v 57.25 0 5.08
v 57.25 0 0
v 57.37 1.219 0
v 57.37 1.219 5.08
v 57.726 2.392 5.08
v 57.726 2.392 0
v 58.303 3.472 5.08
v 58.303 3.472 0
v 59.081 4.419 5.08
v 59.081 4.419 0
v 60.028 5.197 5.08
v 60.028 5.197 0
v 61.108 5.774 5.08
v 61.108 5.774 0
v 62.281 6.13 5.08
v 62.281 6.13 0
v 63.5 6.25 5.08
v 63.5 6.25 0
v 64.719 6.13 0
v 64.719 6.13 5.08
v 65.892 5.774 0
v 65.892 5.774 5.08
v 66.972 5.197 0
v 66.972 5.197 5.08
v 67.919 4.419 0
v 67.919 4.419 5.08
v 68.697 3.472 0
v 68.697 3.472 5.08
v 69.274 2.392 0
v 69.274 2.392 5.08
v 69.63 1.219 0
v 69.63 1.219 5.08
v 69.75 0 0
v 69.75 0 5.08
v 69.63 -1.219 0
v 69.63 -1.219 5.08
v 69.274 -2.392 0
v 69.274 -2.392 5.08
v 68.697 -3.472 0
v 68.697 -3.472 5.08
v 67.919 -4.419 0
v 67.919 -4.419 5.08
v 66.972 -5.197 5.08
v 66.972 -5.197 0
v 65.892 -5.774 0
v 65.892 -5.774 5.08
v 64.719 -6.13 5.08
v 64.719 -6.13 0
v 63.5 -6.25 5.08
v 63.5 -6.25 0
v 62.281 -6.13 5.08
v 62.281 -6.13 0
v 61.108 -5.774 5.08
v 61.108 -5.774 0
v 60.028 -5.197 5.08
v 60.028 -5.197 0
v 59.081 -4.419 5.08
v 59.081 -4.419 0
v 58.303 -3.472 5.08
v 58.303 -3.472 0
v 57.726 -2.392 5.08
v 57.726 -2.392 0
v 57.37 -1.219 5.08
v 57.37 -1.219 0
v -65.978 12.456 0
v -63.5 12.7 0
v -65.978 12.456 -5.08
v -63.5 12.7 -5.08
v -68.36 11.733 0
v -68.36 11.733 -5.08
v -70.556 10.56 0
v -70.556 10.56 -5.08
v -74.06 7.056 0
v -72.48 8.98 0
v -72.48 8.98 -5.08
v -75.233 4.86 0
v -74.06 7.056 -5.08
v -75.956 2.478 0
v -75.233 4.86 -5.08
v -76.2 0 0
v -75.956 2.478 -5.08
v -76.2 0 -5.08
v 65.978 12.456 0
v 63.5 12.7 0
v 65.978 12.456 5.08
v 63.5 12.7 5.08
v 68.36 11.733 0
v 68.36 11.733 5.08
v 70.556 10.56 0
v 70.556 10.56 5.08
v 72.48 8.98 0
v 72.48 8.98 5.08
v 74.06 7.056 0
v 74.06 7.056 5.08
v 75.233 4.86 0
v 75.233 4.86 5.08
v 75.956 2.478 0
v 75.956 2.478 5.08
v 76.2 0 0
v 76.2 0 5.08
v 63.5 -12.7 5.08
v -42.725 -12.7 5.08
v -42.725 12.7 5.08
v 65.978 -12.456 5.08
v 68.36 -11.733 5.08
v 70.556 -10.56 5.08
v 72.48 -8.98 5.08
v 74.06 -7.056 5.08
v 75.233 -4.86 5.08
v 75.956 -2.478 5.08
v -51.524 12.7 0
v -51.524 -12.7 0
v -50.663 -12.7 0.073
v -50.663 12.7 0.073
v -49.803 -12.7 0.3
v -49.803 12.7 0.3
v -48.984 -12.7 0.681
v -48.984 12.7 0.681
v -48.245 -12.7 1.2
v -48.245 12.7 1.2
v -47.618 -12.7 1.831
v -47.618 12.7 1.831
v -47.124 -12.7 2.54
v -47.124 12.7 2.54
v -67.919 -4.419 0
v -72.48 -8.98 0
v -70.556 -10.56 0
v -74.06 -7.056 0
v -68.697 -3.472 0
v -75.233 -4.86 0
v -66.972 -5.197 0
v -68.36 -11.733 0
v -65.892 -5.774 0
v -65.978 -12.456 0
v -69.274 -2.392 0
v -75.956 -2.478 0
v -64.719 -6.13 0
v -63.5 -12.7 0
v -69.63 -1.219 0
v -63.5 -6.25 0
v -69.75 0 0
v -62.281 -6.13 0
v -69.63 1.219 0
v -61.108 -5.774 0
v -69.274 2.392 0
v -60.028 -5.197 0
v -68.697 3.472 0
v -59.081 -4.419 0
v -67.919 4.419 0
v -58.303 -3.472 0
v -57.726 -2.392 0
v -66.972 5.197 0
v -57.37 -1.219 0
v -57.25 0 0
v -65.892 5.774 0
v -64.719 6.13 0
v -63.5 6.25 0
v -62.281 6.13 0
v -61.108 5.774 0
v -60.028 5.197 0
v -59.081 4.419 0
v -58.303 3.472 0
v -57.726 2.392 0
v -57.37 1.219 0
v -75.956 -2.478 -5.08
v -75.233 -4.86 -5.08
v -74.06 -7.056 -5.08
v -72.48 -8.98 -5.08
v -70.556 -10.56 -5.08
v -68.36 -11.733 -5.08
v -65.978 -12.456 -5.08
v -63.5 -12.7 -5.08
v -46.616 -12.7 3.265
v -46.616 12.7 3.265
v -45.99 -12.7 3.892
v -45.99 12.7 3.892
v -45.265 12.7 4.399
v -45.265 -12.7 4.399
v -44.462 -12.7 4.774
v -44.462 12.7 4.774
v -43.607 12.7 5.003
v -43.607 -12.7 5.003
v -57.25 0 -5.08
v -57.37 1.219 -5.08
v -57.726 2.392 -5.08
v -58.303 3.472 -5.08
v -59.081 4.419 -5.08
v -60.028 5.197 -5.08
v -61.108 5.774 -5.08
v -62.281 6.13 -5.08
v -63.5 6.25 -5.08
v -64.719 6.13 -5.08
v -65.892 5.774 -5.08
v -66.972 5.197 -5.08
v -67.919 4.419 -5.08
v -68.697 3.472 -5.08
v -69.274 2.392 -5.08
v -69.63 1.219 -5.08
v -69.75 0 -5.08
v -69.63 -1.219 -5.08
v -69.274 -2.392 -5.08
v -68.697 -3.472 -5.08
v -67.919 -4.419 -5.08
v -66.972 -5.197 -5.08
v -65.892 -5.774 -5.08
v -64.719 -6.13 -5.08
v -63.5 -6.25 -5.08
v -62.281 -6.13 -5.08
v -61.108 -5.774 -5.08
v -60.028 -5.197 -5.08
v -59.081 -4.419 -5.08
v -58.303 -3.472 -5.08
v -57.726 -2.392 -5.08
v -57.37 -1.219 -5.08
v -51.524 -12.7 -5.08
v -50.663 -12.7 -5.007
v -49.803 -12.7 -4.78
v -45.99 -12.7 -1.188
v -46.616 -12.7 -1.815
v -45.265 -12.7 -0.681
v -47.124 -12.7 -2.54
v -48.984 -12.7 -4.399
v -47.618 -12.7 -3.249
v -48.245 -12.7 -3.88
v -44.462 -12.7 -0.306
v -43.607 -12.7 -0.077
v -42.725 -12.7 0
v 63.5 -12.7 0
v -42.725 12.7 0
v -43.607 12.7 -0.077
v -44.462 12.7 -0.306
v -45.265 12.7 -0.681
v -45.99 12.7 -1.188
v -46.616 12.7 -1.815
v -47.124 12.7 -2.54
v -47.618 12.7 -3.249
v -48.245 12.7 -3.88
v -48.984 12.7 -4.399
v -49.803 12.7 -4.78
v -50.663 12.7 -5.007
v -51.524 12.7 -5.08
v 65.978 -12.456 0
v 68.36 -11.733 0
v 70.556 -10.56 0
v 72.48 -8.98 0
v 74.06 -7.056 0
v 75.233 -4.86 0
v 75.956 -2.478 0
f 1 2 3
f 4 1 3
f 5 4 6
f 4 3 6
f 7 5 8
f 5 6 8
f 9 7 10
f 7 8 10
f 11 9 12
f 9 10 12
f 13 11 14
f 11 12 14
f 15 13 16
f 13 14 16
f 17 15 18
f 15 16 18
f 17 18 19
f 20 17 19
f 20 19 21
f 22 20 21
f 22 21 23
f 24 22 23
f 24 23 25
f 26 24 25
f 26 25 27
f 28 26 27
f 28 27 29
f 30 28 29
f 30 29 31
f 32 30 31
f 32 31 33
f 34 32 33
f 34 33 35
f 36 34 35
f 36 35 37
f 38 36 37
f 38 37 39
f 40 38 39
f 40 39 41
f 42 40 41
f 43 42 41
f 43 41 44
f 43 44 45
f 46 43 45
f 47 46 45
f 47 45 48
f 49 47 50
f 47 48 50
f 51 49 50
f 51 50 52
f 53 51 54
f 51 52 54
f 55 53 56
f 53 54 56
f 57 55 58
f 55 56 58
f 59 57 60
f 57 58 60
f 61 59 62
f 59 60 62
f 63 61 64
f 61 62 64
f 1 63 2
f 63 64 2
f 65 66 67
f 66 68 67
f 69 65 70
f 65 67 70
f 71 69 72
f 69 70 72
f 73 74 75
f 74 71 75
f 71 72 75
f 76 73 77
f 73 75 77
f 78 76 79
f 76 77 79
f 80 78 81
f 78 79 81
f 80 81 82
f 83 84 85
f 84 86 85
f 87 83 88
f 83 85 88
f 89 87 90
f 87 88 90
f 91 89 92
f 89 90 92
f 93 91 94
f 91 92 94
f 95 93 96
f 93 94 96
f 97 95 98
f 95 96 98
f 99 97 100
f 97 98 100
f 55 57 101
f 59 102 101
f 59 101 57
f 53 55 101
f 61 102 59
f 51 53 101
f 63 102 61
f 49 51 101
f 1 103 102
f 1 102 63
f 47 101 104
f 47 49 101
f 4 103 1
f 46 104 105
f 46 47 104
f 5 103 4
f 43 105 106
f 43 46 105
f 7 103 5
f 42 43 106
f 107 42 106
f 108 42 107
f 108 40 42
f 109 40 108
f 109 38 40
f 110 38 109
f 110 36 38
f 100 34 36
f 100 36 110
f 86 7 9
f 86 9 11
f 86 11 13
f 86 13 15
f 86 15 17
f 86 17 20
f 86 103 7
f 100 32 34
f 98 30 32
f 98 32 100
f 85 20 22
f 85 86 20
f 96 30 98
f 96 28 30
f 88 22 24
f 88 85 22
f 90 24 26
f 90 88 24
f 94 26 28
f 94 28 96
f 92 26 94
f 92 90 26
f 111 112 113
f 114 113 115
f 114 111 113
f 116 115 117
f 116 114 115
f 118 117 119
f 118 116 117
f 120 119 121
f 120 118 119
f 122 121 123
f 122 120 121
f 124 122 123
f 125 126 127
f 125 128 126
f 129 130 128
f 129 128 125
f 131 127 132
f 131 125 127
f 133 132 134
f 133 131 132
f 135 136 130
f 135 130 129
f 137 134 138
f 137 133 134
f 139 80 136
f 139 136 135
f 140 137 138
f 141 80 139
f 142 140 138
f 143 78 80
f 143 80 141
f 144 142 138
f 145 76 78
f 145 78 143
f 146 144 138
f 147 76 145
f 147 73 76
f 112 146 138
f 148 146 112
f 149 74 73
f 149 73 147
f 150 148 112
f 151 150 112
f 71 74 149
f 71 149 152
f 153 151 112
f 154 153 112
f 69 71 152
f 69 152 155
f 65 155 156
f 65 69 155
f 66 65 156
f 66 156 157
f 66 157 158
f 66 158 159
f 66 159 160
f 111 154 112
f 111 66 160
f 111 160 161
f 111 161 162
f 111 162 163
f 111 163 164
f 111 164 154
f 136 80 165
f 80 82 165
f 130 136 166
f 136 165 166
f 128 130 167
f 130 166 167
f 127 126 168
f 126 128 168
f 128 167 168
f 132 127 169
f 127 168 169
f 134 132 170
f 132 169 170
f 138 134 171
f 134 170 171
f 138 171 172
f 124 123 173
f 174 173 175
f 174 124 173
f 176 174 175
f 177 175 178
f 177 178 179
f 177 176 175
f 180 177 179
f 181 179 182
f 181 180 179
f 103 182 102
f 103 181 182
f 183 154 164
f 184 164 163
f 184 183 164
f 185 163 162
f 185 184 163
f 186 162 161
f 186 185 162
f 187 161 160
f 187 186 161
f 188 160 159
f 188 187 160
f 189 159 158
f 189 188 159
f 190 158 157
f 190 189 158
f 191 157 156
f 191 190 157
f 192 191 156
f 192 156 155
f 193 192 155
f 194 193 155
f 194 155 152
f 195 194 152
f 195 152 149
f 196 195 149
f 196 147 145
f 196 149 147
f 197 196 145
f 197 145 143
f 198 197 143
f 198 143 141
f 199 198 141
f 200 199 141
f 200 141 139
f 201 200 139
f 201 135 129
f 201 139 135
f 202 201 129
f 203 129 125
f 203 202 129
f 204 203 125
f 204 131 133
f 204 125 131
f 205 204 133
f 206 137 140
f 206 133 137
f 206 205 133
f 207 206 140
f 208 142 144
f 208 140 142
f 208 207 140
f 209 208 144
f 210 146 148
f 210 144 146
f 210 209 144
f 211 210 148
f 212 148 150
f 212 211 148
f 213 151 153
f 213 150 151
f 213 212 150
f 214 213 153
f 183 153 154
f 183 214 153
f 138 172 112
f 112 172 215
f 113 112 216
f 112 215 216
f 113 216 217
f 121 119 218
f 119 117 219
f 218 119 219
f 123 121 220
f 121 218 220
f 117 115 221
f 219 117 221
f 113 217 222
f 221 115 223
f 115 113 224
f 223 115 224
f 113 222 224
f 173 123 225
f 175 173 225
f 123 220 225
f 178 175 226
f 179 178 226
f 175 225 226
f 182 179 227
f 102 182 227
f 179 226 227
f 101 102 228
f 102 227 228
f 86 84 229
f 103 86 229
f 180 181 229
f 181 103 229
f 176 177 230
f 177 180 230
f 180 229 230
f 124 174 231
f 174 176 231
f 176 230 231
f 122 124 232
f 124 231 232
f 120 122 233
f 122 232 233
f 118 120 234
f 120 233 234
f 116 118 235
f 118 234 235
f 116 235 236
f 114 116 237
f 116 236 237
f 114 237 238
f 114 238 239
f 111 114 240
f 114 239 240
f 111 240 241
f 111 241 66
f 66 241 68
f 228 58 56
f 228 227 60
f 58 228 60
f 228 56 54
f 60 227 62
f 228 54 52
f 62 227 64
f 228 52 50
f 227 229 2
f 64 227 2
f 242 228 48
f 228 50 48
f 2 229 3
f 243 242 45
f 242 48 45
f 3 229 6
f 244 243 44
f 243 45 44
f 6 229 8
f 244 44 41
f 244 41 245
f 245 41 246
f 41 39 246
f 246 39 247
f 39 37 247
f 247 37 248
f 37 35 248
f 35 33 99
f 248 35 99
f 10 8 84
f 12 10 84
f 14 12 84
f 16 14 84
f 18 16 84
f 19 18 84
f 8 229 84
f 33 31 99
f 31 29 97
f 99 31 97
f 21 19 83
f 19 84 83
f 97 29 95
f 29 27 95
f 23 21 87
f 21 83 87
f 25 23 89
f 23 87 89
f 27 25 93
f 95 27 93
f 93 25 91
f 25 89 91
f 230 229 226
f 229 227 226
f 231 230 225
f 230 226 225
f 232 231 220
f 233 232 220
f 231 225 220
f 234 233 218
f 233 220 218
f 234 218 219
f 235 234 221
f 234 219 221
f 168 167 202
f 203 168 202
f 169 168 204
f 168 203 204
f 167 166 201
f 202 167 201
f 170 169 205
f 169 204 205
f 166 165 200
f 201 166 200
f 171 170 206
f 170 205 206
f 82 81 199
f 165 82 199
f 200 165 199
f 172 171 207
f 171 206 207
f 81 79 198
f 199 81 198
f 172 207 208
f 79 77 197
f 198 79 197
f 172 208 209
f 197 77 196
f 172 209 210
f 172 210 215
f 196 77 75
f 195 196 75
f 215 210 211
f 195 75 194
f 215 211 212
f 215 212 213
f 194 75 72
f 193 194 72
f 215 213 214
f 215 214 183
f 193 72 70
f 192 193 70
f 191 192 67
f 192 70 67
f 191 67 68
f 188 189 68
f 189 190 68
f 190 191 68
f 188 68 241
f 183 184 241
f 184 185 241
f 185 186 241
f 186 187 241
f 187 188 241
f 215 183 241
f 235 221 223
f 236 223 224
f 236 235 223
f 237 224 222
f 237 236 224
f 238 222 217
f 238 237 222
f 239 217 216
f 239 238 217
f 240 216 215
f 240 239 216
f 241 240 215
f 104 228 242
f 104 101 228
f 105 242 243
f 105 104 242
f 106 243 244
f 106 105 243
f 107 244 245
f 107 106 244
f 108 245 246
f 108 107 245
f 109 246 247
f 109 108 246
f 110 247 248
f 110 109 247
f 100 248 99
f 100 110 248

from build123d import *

# Parameters (mm, degrees)
SKETCH1_W                    = 152.4
SKETCH1_H                    = 25.4
BOSS_EXTRUDE1_DEPTH          = 5.08
F_12_5_12_5_DIAMETER_HOLE1_D = 12.5
FILLET3_R                    = 12.7
CUT_EXTRUDE1_START           = -76.2
CUT_EXTRUDE1_OUTLINE_W       = 25.4
CUT_EXTRUDE1_OUTLINE_H       = 2.54
CUT_EXTRUDE1_DEPTH           = 28.395084053
BOSS_EXTRUDE2_START          = -7.62
SKETCH10_R                   = 6.25
BOSS_EXTRUDE2_DEPTH          = 7.62
FILLET12_R                   = 5.08
CUT_EXTRUDE2_START           = -2.54
SKETCH12_R                   = 6.25
CUT_EXTRUDE2_DEPTH           = 2.54
FILLET14_R                   = 5.08
FILLET13_R                   = 5.08
FILLET15_R                   = 5.08


# Read off the part's stored shape, not the designer's step: Cut-Extrude1
with BuildPart() as part:
    # Sketch1 → Boss-Extrude1 (new body)
    with BuildSketch(Plane.XY):
        Rectangle(SKETCH1_W, SKETCH1_H)
    extrude(amount=BOSS_EXTRUDE1_DEPTH)

    # Ø12.5 (12.5) Diameter Hole1 (through all)
    with Locations(Plane.XY.offset(5.08)):
        with Locations((-63.5, 0), (63.5, 0)):
            Hole(F_12_5_12_5_DIAMETER_HOLE1_D / 2)

    # Fillet3
    fillet3_edges = [part.edges().sort_by_distance(p)[0] for p in [
        (-76.2, 12.7, 2.54),
        (-76.2, -12.7, 2.54),
        (76.2, -12.7, 2.54),
        (76.2, 12.7, 2.54),
    ]]
    fillet(fillet3_edges, radius=FILLET3_R - 0.0001)  # a hair under: the kernel refuses the full size

    # Cut-Extrude1 outline → Cut-Extrude1 (cut)
    with BuildSketch(Plane.YZ.offset(CUT_EXTRUDE1_START)):
        with Locations((0, 3.81)):
            Rectangle(CUT_EXTRUDE1_OUTLINE_W, CUT_EXTRUDE1_OUTLINE_H)
    extrude(amount=CUT_EXTRUDE1_DEPTH, mode=Mode.SUBTRACT)

    # Sketch10 → Boss-Extrude2 (add)
    with BuildSketch(Plane.XY.offset(2.54).offset(BOSS_EXTRUDE2_START)):
        with BuildLine():
            Line((-47.804915947, 12.7), (-63.5, 12.7))
            ThreePointArc((-63.5, 12.7), (-72.480256121, 8.980256121), (-76.2, 0))
            ThreePointArc((-76.2, 0), (-72.480256121, -8.980256121), (-63.5, -12.7))
            Line((-63.5, -12.7), (-47.804915947, -12.7))
            Line((-47.804915947, -12.7), (-47.804915947, 12.7))
        make_face()
        with Locations((-63.5, 0)):
            Circle(SKETCH10_R, mode=Mode.SUBTRACT)
    extrude(amount=BOSS_EXTRUDE2_DEPTH)

    # Fillet12
    fillet12_edges = [part.edges().sort_by_distance(p)[0] for p in [
        (-47.804915947, 0, 0),
    ]]
    fillet(fillet12_edges, radius=FILLET12_R - 0.0001)  # a hair under: the kernel refuses the full size

    # Sketch12 → Cut-Extrude2 (cut)
    with BuildSketch(Plane.XY.offset(2.54).offset(CUT_EXTRUDE2_START)):
        with BuildLine():
            Line((-63.5, -12.7), (-47.804915947, -12.7))
            Line((-47.804915947, -12.7), (-47.804915947, 12.7))
            Line((-47.804915947, 12.7), (-63.5, 12.7))
            ThreePointArc((-63.5, 12.7), (-76.2, 0), (-63.5, -12.7))
        make_face()
        with Locations((-63.5, 0)):
            Circle(SKETCH12_R, mode=Mode.SUBTRACT)
    extrude(amount=CUT_EXTRUDE2_DEPTH, mode=Mode.SUBTRACT)


with BuildPart() as cut_extrude2_kept_piece:
    # of the separate pieces the step leaves, the one the design keeps (cut_extrude2_pieces_kept)
    add(part.part.solids().sort_by_distance((-42.725015947, -12.7, 0))[0])

    # Fillet14
    fillet14_edges = [cut_extrude2_kept_piece.edges().sort_by_distance(p)[0] for p in [
        (-47.804915947, 0, 5.08),
    ]]
    fillet(fillet14_edges, radius=FILLET14_R - 0.0001)  # a hair under: the kernel refuses the full size

    # Fillet13
    fillet13_edges = [cut_extrude2_kept_piece.edges().sort_by_distance(p)[0] for p in [
        (-47.804915947, 0, -5.08),
    ]]
    fillet(fillet13_edges, radius=FILLET13_R)

    # Fillet15
    fillet15_edges = [cut_extrude2_kept_piece.edges().sort_by_distance(p)[0] for p in [
        (-47.804915947, 0, 0),
    ]]
    fillet(fillet15_edges, radius=FILLET15_R)


solid = cut_extrude2_kept_piece.part
